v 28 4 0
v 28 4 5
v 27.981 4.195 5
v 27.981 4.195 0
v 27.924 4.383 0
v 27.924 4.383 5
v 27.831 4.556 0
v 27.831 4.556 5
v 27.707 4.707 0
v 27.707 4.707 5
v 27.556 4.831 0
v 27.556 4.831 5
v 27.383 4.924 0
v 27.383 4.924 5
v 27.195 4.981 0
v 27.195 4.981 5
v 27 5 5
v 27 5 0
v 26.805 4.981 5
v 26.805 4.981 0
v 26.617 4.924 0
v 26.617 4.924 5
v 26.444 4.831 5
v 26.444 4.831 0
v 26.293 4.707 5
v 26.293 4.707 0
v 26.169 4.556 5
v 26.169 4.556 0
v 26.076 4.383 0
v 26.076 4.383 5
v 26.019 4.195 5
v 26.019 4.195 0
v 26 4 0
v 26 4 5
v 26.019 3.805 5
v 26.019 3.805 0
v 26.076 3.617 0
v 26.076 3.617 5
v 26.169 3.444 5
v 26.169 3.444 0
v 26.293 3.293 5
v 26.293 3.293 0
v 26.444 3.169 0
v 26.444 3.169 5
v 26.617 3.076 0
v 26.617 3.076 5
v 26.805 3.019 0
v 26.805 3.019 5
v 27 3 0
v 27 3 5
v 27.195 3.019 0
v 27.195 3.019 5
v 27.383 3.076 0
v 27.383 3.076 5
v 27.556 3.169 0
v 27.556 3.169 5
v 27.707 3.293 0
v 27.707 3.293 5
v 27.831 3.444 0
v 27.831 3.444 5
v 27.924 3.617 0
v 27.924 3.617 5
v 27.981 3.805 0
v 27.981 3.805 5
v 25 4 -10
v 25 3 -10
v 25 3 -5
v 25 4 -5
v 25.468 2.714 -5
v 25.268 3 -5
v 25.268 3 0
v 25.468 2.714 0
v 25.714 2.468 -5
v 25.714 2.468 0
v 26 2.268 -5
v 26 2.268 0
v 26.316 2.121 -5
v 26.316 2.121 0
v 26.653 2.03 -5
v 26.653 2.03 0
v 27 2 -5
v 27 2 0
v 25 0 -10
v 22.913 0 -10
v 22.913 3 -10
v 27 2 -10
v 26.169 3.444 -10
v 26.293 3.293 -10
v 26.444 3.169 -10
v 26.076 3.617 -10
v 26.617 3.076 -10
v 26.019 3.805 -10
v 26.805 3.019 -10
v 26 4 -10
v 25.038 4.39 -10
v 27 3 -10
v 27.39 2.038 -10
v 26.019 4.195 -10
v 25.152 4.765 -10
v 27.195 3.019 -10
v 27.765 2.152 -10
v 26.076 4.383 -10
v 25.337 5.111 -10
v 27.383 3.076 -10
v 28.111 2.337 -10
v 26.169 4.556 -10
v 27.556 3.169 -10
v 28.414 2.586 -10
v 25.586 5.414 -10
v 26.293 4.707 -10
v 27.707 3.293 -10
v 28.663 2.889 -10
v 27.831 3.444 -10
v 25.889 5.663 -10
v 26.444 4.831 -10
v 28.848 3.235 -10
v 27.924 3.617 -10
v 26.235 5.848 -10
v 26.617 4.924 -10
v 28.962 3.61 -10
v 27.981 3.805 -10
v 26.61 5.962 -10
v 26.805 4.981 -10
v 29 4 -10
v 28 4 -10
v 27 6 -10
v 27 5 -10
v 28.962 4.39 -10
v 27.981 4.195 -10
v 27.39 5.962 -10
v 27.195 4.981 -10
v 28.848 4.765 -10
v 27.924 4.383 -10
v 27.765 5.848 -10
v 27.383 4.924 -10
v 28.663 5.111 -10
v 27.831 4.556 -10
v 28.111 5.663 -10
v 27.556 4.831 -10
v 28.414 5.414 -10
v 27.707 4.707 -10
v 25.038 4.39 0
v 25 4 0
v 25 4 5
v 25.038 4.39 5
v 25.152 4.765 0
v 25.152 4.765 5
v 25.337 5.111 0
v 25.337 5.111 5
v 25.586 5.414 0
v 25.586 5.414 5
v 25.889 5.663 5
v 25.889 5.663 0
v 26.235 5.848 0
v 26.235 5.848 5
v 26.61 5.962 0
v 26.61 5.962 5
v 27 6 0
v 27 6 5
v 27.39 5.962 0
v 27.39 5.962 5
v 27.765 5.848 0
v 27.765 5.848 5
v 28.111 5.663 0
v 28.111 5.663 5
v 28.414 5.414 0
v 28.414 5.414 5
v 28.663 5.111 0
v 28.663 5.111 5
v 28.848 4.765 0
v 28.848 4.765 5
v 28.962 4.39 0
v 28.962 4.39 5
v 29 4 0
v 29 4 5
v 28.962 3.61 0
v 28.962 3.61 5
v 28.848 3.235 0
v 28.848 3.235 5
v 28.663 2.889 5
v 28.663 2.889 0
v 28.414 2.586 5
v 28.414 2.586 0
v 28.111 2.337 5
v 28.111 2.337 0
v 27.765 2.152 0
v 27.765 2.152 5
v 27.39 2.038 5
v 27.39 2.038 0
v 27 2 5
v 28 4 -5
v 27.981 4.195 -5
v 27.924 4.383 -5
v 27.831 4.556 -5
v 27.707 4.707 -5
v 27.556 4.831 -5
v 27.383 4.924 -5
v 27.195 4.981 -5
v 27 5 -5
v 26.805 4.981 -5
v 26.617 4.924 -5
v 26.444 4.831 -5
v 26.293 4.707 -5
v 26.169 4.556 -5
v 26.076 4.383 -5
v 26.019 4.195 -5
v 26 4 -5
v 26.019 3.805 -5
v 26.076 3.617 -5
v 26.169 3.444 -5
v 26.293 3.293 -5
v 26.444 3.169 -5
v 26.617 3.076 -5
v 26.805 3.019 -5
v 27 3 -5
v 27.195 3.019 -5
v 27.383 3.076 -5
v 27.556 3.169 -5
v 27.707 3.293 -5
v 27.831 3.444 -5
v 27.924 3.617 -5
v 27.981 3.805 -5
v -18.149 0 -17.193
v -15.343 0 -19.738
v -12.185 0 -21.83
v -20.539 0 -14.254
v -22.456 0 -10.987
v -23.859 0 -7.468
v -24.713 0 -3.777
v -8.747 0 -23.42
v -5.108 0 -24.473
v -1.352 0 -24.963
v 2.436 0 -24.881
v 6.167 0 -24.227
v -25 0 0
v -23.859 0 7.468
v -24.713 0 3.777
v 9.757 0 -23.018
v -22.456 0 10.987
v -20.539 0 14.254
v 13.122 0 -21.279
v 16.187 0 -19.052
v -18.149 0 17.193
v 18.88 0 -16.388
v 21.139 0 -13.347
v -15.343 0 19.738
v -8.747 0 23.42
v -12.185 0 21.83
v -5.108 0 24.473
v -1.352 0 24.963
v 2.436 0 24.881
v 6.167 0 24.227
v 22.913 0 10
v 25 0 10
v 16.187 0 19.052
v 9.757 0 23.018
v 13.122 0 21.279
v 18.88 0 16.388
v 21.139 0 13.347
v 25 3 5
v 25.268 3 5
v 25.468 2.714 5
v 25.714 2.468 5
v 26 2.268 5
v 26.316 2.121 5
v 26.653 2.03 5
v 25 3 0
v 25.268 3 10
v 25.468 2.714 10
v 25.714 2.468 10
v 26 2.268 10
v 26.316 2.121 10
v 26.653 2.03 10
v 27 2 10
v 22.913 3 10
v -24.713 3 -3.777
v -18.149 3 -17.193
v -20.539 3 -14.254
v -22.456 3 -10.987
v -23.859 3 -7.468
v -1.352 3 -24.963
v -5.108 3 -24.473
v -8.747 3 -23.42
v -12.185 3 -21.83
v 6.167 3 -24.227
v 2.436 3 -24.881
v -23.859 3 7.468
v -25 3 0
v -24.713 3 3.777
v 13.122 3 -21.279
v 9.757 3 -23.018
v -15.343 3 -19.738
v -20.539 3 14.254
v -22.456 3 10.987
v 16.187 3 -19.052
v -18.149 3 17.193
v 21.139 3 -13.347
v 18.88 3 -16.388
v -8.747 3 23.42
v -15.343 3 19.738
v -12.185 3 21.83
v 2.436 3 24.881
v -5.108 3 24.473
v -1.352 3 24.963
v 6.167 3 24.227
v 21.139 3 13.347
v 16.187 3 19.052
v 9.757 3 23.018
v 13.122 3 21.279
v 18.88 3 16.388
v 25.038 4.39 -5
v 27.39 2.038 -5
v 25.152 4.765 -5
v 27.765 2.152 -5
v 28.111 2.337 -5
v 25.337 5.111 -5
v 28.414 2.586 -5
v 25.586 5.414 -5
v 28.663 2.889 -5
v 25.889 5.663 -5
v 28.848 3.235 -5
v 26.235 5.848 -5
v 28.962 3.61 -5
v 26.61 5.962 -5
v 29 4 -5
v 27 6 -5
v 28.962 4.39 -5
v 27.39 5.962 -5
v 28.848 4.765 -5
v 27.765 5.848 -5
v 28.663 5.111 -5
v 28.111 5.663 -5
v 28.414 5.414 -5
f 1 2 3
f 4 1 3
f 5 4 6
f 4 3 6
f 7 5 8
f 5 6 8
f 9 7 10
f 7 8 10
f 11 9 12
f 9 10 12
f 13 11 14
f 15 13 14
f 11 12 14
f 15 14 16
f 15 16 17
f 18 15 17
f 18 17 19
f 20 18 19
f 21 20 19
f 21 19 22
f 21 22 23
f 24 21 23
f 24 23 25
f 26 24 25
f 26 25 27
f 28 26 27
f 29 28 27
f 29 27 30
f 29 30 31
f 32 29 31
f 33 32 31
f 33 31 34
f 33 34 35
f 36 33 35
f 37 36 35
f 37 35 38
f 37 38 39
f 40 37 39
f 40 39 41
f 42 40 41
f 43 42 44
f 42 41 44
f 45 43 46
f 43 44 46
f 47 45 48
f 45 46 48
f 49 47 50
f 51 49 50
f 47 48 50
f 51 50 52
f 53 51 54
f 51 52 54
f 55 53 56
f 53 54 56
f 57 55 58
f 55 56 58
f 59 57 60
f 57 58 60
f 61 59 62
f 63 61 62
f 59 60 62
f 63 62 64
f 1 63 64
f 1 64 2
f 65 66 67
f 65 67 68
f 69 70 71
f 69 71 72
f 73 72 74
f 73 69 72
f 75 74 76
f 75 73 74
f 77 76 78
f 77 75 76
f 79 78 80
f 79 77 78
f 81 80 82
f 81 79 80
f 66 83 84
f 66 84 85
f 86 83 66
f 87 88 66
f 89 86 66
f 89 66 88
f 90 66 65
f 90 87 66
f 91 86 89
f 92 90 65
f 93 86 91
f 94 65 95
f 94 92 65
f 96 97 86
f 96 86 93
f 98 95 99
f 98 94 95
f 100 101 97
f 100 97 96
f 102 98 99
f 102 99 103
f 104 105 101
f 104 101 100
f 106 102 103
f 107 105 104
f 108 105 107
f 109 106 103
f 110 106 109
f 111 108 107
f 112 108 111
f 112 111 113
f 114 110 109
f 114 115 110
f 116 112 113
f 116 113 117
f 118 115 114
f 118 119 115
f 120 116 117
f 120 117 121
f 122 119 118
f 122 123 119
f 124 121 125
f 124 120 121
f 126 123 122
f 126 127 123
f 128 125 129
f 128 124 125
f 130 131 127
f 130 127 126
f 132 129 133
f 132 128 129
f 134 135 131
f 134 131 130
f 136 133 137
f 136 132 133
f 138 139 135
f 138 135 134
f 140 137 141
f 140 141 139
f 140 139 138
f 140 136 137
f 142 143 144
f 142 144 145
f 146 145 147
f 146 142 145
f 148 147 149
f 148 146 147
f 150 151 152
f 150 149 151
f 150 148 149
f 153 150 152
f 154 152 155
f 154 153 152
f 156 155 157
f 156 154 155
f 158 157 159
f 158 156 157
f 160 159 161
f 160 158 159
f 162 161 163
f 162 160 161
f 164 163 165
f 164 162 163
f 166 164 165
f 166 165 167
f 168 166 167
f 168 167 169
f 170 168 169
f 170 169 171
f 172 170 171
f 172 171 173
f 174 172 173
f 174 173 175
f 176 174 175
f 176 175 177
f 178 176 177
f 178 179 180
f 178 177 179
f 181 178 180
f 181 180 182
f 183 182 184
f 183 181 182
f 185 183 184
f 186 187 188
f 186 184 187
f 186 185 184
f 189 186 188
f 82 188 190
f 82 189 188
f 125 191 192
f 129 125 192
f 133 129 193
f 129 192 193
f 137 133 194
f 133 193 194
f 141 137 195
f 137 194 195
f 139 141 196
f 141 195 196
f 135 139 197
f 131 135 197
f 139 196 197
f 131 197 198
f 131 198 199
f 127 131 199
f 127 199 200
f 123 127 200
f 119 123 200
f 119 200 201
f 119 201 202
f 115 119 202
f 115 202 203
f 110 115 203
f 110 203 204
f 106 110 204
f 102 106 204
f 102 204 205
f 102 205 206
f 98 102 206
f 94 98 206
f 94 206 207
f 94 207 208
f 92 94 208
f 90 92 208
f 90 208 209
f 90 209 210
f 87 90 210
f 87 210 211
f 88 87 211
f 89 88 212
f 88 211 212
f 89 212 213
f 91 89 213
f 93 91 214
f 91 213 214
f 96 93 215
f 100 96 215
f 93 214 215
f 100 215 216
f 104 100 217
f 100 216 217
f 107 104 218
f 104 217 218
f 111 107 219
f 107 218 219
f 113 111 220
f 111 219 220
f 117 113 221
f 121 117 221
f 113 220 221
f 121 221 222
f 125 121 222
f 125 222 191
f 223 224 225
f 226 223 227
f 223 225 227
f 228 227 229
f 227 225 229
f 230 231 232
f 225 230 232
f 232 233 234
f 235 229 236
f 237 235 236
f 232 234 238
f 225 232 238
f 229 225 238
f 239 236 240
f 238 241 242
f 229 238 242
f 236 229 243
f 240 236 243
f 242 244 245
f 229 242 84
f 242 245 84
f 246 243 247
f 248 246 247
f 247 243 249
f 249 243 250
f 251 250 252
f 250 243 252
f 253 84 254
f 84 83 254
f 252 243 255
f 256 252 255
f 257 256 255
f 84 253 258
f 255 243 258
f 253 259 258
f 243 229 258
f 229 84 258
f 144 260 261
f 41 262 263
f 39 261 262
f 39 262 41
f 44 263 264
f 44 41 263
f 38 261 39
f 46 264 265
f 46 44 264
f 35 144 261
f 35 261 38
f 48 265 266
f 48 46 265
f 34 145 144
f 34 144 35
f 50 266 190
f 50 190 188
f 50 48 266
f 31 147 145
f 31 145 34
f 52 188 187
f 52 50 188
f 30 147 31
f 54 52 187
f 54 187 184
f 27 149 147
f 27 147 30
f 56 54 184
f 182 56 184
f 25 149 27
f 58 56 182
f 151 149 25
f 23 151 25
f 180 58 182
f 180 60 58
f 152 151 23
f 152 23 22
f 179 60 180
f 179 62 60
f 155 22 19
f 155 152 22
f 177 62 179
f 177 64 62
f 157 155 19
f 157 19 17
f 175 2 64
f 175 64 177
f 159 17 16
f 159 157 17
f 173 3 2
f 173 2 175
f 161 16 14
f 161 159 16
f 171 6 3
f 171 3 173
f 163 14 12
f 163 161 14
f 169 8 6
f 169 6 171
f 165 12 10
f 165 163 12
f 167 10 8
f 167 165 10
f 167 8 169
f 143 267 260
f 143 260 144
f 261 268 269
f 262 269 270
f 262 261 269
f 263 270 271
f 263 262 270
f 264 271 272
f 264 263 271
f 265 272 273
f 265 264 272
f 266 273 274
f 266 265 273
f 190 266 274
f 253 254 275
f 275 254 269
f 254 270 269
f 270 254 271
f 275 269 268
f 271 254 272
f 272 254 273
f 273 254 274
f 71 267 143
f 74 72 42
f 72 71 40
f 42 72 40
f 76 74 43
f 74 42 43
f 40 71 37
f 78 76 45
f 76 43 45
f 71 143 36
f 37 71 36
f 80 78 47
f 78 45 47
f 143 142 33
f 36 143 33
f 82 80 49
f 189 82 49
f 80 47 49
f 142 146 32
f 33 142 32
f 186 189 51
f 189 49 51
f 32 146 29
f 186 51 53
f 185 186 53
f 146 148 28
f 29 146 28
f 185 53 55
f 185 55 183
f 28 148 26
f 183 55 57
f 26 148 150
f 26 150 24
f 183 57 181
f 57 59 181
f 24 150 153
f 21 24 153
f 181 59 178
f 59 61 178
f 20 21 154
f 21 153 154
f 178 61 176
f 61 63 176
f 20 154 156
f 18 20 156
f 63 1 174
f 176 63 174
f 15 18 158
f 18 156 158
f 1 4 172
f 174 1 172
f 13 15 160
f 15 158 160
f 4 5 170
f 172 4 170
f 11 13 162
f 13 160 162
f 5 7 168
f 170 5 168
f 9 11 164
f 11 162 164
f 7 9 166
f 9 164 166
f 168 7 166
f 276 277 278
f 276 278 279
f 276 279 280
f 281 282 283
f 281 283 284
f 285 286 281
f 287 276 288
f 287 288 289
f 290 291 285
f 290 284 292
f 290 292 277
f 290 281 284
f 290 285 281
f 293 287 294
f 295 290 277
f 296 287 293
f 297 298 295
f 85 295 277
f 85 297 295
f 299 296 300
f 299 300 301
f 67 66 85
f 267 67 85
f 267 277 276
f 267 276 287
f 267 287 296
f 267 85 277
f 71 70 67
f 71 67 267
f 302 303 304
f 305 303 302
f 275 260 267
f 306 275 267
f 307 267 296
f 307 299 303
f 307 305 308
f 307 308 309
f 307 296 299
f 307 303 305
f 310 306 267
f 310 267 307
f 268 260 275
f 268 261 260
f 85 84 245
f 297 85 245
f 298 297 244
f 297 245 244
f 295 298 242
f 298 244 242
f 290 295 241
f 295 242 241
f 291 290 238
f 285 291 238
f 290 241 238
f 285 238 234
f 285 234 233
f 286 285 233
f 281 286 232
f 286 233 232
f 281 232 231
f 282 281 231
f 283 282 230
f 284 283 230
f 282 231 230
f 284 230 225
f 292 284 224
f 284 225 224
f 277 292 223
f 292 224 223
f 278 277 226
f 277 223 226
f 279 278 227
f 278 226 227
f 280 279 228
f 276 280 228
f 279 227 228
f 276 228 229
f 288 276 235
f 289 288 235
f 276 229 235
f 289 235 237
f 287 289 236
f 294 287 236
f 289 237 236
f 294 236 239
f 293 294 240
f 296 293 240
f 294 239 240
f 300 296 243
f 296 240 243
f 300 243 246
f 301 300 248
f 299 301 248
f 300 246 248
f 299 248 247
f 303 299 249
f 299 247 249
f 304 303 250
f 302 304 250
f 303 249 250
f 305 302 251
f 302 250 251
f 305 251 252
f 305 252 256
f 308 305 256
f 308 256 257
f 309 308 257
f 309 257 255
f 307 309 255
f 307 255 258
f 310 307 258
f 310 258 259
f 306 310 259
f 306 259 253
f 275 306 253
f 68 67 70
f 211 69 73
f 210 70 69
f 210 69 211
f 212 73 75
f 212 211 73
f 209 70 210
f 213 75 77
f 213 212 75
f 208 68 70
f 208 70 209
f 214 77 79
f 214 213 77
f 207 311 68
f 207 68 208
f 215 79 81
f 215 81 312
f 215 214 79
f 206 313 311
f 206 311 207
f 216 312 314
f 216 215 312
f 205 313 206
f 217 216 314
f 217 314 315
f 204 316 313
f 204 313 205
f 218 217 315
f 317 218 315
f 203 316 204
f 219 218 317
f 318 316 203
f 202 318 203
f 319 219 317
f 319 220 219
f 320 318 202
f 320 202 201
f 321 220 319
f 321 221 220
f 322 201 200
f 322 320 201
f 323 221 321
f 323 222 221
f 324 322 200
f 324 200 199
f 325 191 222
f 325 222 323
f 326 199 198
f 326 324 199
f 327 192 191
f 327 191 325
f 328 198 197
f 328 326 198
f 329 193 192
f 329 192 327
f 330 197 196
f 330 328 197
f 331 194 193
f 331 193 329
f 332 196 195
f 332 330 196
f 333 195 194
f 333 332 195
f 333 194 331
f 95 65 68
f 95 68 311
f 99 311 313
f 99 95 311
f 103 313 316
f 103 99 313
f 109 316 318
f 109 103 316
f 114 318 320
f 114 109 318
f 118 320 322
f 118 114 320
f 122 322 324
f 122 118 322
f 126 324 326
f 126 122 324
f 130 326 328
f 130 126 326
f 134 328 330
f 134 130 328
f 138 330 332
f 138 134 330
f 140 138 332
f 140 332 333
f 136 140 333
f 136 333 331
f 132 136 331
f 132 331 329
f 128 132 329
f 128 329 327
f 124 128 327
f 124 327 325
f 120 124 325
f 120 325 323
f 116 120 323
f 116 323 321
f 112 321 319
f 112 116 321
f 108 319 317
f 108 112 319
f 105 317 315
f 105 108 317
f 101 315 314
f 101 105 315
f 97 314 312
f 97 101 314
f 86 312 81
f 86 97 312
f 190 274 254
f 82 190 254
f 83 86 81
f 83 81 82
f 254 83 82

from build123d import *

# Parameters (mm, degrees)
SKETCH1_R                = 25
BOSS_EXTRUDE1_DEPTH      = 3
BOSS_EXTRUDE2_DEPTH      = 10
BOSS_EXTRUDE2_DEPTH_BACK = 10
BOSS_EXTRUDE3_REACH      = 58.223
BOSS_EXTRUDE3_END_RADIUS = 25
SKETCH3_W                = 20
SKETCH3_H                = 3
SKETCH6_R                = 1
CUT_EXTRUDE1_DEPTH       = 20
CUT_EXTRUDE2_START       = -5
CUT_EXTRUDE2_DEPTH       = 5
LPATTERN1_COUNT          = 2
LPATTERN1_PITCH          = 10


with BuildPart() as part:
    # Sketch1 → Boss-Extrude1 (new body)
    with BuildSketch(Plane(origin=(0, 0, 0), x_dir=(1, 0, 0), z_dir=(0, 1, 0))):
        with Locations(Location((0, 0, 0), (0, 0, 270))):
            Circle(SKETCH1_R)
    extrude(amount=BOSS_EXTRUDE1_DEPTH)



with BuildPart() as body_2:
    # Sketch2 → Boss-Extrude2 (new, two sides: drawn at the far end of the back side and taken through both)
    with BuildSketch(Plane.XY.offset(-BOSS_EXTRUDE2_DEPTH_BACK)):
        with BuildLine():
            Line((25, 3), (25, 4))
            ThreePointArc((25, 4), (28.414213562, 5.414213562), (27, 2))
            Line((27, 2), (25, 0))
            Line((25, 0), (25, 3))
        make_face()
    extrude(amount=BOSS_EXTRUDE2_DEPTH + BOSS_EXTRUDE2_DEPTH_BACK)


with BuildPart() as part_1:
    add(part.part)

    add(body_2.part)  # Boss-Extrude3 merges body 2
    # Boss-Extrude3: up to this cylinder (the profile starts outside it)
    boss_extrude3_end = Plane(origin=(0, 1.5, 0), z_dir=(0, -1, 0)) * Cylinder(BOSS_EXTRUDE3_END_RADIUS, 167.446, mode=Mode.PRIVATE)
    # Sketch3 → Boss-Extrude3 (add, up to the surface)
    with BuildSketch(Plane.ZY.offset(-25), mode=Mode.PRIVATE) as boss_extrude3_sk1:
        with Locations((0, 1.5)):
            Rectangle(SKETCH3_W, SKETCH3_H)
    boss_extrude3_tool1 = extrude(boss_extrude3_sk1.sketch, amount=BOSS_EXTRUDE3_REACH, mode=Mode.PRIVATE) - boss_extrude3_end
    add(boss_extrude3_tool1.solids().sort_by_distance((25, 1.5, 0))[0])
    add(boss_extrude3_tool1.solids().sort_by_distance((25, 1.5, 0))[1])

    # Sketch6 → Cut-Extrude1 (cut)
    with BuildSketch(Plane.XY.offset(10)):
        with Locations((27, 4)):
            Circle(SKETCH6_R)
    extrude(amount=-CUT_EXTRUDE1_DEPTH, mode=Mode.SUBTRACT)

    # Sketch7 → Cut-Extrude2 (cut)
    with BuildSketch(Plane.XY.offset(10).offset(CUT_EXTRUDE2_START)):
        with BuildLine():
            Line((25, 3), (25.267949192, 3))
            ThreePointArc((25.267949192, 3), (28.931851653, 4.51763809), (25, 4))
            Line((25, 4), (25, 3))
        make_face()
    cut_extrude2 = extrude(amount=CUT_EXTRUDE2_DEPTH, mode=Mode.SUBTRACT)

    # LPattern1: Cut-Extrude2 ×2
    with Locations(*[(0, 0, -i * LPATTERN1_PITCH) for i in range(1, LPATTERN1_COUNT)]):
        add(cut_extrude2, mode=Mode.SUBTRACT)


solid = part_1.part
